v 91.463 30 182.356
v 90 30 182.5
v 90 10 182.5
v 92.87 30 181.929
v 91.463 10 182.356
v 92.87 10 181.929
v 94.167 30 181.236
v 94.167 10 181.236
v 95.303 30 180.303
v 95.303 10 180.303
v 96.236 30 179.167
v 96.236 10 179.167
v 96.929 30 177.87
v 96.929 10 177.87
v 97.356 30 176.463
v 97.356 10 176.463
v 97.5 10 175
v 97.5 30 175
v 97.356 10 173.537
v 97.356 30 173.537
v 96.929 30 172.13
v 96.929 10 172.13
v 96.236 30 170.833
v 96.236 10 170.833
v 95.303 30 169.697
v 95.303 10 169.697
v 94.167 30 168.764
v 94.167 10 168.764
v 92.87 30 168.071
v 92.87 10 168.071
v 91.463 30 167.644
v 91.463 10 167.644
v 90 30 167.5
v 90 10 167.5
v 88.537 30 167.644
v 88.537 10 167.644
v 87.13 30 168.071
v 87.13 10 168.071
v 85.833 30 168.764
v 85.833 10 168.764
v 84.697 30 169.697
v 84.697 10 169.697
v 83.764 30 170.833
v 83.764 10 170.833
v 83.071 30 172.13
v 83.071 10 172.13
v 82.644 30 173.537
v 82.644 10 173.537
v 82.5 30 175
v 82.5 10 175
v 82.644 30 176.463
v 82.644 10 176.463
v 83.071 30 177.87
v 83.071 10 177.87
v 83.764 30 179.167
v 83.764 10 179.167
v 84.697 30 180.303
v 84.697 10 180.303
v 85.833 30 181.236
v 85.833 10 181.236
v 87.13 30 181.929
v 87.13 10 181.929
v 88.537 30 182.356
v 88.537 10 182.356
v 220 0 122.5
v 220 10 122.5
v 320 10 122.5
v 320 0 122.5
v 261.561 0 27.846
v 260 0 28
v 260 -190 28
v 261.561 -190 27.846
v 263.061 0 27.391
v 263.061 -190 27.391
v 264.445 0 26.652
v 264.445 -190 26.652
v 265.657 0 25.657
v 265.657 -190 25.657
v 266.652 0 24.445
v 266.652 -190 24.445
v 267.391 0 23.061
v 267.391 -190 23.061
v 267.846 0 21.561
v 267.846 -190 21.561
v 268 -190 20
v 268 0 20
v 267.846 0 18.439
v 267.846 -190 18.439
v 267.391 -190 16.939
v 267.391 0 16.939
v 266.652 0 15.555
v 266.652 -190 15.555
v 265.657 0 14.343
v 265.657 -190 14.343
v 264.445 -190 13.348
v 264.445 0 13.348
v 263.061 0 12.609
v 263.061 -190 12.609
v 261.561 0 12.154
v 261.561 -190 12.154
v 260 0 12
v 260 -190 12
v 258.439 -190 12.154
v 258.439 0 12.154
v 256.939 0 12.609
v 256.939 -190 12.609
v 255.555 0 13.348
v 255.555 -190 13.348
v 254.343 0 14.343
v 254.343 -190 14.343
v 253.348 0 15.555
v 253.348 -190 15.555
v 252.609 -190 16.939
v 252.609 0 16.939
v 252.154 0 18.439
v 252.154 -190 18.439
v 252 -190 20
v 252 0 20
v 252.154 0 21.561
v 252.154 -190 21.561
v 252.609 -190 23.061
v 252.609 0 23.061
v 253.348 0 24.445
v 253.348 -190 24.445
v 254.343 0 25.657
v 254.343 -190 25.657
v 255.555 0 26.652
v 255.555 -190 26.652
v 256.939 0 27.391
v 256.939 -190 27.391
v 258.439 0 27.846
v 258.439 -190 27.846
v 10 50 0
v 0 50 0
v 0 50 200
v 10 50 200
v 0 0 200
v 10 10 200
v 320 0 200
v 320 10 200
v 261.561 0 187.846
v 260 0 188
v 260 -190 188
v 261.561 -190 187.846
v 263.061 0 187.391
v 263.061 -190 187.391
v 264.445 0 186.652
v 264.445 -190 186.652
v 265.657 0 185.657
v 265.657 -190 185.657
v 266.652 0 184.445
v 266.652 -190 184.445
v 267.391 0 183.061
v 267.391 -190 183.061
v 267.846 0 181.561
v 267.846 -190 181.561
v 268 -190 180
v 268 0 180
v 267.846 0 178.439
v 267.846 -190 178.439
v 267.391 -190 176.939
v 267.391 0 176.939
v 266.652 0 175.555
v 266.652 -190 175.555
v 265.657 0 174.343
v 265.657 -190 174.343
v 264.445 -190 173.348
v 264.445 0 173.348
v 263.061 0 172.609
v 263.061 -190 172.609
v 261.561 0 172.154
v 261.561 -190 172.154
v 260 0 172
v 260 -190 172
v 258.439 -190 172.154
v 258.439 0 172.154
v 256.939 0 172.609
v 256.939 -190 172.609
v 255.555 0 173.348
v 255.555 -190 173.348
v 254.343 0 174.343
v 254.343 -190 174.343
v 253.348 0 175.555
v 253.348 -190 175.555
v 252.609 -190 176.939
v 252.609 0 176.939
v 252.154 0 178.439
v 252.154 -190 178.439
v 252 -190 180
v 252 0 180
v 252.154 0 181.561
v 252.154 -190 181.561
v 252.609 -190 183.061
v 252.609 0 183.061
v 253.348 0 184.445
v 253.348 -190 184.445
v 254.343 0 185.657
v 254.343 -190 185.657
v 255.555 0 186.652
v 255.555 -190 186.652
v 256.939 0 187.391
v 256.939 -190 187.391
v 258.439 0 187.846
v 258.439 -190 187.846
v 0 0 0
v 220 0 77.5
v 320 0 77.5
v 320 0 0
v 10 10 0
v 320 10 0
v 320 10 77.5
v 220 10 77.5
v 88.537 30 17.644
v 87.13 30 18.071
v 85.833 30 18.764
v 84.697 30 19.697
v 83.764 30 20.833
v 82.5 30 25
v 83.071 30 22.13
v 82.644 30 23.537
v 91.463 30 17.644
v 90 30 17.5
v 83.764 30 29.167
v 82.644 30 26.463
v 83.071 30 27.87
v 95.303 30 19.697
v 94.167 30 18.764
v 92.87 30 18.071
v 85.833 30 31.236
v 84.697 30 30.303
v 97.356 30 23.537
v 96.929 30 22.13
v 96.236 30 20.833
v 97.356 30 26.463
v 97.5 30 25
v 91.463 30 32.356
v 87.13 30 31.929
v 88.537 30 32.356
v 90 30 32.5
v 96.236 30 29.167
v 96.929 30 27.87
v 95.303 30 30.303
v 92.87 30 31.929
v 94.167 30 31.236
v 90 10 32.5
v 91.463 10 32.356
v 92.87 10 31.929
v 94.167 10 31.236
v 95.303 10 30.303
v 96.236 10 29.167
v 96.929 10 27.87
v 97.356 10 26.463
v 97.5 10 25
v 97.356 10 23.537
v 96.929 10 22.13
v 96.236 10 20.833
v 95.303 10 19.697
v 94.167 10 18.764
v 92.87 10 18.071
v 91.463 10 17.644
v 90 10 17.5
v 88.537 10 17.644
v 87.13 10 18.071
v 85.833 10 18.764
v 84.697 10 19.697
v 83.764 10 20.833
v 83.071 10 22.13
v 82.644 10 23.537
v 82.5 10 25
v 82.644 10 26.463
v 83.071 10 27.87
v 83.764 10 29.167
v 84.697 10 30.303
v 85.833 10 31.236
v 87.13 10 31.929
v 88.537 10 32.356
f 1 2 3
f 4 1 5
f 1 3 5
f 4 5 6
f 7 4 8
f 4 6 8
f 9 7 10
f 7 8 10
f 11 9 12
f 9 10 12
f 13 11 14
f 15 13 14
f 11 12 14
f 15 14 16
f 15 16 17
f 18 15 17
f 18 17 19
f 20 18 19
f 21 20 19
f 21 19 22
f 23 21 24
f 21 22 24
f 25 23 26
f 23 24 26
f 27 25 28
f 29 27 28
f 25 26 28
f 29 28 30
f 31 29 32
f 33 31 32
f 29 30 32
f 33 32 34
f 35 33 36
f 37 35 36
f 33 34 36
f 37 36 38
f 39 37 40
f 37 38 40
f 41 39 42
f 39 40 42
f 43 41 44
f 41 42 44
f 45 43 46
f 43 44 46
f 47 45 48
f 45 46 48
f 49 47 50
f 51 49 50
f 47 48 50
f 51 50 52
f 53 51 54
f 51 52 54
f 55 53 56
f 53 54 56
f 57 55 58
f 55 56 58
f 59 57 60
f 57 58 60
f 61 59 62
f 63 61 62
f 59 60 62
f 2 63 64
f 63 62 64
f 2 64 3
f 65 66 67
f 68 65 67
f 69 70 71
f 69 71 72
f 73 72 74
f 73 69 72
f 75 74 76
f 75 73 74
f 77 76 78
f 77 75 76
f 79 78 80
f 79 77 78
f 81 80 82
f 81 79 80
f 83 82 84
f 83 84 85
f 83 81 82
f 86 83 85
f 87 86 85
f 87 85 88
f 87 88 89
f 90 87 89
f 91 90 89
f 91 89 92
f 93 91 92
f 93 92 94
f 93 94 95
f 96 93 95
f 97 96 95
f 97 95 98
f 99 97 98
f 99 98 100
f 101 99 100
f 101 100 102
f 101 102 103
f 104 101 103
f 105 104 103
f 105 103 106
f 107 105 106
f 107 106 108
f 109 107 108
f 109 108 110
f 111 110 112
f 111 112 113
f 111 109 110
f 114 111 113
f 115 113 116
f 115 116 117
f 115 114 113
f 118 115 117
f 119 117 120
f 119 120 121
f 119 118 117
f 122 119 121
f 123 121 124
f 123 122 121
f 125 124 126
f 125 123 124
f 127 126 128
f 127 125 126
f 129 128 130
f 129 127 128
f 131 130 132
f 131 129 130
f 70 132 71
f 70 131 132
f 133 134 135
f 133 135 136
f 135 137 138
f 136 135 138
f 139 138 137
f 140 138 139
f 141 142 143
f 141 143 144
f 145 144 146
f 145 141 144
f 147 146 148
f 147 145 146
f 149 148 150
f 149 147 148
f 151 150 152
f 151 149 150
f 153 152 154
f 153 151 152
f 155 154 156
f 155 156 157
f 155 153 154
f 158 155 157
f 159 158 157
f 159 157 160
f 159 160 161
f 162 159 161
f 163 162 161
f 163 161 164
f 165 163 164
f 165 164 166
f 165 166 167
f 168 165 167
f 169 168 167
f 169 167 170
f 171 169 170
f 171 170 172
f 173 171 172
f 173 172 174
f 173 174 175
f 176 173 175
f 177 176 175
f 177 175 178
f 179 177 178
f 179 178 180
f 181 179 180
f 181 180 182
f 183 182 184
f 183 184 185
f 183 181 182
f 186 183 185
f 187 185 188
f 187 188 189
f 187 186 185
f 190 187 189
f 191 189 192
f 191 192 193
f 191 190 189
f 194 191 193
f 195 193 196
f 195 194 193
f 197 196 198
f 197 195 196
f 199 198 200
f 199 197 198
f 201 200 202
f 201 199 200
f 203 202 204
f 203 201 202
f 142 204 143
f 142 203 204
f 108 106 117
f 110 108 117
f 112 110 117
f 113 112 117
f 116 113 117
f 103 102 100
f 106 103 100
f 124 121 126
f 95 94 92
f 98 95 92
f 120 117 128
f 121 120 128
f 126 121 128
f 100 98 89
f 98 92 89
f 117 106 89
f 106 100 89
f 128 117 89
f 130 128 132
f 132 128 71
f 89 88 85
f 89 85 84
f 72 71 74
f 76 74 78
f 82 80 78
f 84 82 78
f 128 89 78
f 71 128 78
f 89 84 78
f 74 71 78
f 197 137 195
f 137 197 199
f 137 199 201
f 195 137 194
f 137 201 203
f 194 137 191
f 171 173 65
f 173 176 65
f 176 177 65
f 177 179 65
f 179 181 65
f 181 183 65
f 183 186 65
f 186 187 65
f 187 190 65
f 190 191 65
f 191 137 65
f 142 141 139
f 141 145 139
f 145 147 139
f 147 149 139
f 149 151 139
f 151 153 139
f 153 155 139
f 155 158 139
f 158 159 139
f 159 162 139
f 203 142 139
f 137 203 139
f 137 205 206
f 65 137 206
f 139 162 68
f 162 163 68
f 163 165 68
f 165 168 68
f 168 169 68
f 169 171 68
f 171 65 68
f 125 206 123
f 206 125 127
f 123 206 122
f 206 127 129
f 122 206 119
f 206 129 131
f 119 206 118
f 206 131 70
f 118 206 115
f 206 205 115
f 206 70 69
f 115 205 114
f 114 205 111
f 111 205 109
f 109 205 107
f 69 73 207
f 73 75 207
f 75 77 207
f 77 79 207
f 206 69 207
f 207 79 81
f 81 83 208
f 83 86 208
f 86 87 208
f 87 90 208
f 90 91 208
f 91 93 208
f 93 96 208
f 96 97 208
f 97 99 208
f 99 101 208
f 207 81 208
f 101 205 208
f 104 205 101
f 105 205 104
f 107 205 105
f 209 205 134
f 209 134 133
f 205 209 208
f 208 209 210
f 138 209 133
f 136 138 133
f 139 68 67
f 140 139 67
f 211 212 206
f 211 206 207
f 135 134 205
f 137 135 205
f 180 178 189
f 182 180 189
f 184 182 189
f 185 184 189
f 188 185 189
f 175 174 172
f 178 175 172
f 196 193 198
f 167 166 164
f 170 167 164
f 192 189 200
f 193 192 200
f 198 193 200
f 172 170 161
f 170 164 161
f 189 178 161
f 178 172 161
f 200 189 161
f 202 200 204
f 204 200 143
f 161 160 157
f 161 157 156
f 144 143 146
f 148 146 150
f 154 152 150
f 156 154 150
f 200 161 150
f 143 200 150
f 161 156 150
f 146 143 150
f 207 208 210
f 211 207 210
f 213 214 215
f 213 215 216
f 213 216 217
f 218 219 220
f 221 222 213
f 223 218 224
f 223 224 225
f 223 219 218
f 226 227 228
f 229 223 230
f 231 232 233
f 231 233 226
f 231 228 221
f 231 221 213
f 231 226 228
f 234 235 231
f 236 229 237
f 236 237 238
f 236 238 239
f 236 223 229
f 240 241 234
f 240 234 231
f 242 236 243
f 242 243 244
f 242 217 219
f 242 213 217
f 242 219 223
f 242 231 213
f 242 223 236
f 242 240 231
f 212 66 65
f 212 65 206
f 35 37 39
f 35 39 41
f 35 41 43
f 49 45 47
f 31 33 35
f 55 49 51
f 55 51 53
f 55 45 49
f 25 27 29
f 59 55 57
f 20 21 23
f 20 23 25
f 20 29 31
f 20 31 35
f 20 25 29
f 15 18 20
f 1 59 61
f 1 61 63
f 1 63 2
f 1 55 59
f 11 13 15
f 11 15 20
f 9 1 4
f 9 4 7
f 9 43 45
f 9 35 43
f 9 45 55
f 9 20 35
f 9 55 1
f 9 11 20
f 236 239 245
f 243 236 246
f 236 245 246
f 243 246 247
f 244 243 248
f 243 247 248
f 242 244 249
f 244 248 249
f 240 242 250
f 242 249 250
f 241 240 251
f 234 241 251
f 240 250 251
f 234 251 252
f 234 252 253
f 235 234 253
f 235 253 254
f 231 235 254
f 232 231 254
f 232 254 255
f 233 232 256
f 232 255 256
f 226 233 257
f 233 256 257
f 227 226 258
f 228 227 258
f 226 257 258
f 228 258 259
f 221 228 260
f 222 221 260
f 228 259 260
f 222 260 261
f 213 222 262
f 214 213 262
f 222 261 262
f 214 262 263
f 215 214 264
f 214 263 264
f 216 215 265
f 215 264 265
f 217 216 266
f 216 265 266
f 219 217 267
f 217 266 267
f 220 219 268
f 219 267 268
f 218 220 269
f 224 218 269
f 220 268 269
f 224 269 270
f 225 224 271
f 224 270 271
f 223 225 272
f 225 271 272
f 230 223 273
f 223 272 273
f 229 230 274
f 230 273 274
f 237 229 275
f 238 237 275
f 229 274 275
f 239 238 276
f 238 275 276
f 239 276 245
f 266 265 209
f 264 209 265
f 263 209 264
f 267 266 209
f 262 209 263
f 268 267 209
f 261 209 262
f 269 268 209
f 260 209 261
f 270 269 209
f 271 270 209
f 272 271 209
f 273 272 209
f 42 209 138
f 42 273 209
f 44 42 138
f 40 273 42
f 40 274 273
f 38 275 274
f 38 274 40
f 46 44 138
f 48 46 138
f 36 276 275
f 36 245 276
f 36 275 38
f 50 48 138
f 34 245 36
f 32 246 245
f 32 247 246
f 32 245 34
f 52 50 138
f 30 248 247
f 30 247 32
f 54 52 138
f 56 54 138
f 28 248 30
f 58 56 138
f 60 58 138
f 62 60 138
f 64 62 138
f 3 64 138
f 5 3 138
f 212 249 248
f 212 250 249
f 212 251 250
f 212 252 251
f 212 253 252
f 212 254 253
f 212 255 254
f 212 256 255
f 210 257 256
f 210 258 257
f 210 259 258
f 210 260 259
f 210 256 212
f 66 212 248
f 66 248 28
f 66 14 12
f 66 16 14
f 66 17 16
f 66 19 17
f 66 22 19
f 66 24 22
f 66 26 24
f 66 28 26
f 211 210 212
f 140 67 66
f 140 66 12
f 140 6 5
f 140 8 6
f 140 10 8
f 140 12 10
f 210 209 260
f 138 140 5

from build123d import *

# Parameters (mm, degrees)
ESQUISSE1_W             = 310
ESQUISSE1_H             = 10
ESQUISSE1_W_2           = 10
ESQUISSE1_H_2           = 40
BOSS_EXTRU_1_DEPTH      = 200
ESQUISSE2_R             = 7.5
BOSS_EXTRU_2_DEPTH      = 20
ESQUISSE3_R             = 8
BOSS_EXTRU_3_DEPTH      = 200
ESQUISSE4_W             = 100
ESQUISSE4_H             = 45
ENL_V_MAT_EXTRU_1_DEPTH = 10


with BuildPart() as part:
    # Esquisse1 → Boss.-Extru.1 (new body)
    with BuildSketch(Plane.XY):
        with Locations((165, 5)):
            Rectangle(ESQUISSE1_W, ESQUISSE1_H)
        with Locations((5, 30)):
            Rectangle(ESQUISSE1_W_2, ESQUISSE1_H_2)
        with Locations((5, 5)):
            Rectangle(ESQUISSE1_W_2, ESQUISSE1_H)
    extrude(amount=BOSS_EXTRU_1_DEPTH)

    # Esquisse2 → Boss.-Extru.2 (add)
    with BuildSketch(Plane(origin=(0, 10, 0), x_dir=(1, 0, 0), z_dir=(0, 1, 0))):
        with Locations(Location((90, -25, 0), (0, 0, 270))):
            Circle(ESQUISSE2_R)
        with Locations(Location((90, -175, 0), (0, 0, 270))):
            Circle(ESQUISSE2_R)
    extrude(amount=BOSS_EXTRU_2_DEPTH)

    # Esquisse3 → Boss.-Extru.3 (add)
    with BuildSketch(Plane(origin=(0, 10, 0), x_dir=(1, 0, 0), z_dir=(0, 1, 0))):
        with Locations(Location((260, -20, 0), (0, 0, 270))):
            Circle(ESQUISSE3_R)
        with Locations(Location((260, -180, 0), (0, 0, 270))):
            Circle(ESQUISSE3_R)
    extrude(amount=-BOSS_EXTRU_3_DEPTH)

    # Esquisse4 → Enlèv. mat.-Extru.1 (cut)
    with BuildSketch(Plane(origin=(0, 10, 0), x_dir=(1, 0, 0), z_dir=(0, 1, 0))):
        with Locations((270, -100)):
            Rectangle(ESQUISSE4_W, ESQUISSE4_H)
    extrude(amount=-ENL_V_MAT_EXTRU_1_DEPTH, mode=Mode.SUBTRACT)


solid = part.part
